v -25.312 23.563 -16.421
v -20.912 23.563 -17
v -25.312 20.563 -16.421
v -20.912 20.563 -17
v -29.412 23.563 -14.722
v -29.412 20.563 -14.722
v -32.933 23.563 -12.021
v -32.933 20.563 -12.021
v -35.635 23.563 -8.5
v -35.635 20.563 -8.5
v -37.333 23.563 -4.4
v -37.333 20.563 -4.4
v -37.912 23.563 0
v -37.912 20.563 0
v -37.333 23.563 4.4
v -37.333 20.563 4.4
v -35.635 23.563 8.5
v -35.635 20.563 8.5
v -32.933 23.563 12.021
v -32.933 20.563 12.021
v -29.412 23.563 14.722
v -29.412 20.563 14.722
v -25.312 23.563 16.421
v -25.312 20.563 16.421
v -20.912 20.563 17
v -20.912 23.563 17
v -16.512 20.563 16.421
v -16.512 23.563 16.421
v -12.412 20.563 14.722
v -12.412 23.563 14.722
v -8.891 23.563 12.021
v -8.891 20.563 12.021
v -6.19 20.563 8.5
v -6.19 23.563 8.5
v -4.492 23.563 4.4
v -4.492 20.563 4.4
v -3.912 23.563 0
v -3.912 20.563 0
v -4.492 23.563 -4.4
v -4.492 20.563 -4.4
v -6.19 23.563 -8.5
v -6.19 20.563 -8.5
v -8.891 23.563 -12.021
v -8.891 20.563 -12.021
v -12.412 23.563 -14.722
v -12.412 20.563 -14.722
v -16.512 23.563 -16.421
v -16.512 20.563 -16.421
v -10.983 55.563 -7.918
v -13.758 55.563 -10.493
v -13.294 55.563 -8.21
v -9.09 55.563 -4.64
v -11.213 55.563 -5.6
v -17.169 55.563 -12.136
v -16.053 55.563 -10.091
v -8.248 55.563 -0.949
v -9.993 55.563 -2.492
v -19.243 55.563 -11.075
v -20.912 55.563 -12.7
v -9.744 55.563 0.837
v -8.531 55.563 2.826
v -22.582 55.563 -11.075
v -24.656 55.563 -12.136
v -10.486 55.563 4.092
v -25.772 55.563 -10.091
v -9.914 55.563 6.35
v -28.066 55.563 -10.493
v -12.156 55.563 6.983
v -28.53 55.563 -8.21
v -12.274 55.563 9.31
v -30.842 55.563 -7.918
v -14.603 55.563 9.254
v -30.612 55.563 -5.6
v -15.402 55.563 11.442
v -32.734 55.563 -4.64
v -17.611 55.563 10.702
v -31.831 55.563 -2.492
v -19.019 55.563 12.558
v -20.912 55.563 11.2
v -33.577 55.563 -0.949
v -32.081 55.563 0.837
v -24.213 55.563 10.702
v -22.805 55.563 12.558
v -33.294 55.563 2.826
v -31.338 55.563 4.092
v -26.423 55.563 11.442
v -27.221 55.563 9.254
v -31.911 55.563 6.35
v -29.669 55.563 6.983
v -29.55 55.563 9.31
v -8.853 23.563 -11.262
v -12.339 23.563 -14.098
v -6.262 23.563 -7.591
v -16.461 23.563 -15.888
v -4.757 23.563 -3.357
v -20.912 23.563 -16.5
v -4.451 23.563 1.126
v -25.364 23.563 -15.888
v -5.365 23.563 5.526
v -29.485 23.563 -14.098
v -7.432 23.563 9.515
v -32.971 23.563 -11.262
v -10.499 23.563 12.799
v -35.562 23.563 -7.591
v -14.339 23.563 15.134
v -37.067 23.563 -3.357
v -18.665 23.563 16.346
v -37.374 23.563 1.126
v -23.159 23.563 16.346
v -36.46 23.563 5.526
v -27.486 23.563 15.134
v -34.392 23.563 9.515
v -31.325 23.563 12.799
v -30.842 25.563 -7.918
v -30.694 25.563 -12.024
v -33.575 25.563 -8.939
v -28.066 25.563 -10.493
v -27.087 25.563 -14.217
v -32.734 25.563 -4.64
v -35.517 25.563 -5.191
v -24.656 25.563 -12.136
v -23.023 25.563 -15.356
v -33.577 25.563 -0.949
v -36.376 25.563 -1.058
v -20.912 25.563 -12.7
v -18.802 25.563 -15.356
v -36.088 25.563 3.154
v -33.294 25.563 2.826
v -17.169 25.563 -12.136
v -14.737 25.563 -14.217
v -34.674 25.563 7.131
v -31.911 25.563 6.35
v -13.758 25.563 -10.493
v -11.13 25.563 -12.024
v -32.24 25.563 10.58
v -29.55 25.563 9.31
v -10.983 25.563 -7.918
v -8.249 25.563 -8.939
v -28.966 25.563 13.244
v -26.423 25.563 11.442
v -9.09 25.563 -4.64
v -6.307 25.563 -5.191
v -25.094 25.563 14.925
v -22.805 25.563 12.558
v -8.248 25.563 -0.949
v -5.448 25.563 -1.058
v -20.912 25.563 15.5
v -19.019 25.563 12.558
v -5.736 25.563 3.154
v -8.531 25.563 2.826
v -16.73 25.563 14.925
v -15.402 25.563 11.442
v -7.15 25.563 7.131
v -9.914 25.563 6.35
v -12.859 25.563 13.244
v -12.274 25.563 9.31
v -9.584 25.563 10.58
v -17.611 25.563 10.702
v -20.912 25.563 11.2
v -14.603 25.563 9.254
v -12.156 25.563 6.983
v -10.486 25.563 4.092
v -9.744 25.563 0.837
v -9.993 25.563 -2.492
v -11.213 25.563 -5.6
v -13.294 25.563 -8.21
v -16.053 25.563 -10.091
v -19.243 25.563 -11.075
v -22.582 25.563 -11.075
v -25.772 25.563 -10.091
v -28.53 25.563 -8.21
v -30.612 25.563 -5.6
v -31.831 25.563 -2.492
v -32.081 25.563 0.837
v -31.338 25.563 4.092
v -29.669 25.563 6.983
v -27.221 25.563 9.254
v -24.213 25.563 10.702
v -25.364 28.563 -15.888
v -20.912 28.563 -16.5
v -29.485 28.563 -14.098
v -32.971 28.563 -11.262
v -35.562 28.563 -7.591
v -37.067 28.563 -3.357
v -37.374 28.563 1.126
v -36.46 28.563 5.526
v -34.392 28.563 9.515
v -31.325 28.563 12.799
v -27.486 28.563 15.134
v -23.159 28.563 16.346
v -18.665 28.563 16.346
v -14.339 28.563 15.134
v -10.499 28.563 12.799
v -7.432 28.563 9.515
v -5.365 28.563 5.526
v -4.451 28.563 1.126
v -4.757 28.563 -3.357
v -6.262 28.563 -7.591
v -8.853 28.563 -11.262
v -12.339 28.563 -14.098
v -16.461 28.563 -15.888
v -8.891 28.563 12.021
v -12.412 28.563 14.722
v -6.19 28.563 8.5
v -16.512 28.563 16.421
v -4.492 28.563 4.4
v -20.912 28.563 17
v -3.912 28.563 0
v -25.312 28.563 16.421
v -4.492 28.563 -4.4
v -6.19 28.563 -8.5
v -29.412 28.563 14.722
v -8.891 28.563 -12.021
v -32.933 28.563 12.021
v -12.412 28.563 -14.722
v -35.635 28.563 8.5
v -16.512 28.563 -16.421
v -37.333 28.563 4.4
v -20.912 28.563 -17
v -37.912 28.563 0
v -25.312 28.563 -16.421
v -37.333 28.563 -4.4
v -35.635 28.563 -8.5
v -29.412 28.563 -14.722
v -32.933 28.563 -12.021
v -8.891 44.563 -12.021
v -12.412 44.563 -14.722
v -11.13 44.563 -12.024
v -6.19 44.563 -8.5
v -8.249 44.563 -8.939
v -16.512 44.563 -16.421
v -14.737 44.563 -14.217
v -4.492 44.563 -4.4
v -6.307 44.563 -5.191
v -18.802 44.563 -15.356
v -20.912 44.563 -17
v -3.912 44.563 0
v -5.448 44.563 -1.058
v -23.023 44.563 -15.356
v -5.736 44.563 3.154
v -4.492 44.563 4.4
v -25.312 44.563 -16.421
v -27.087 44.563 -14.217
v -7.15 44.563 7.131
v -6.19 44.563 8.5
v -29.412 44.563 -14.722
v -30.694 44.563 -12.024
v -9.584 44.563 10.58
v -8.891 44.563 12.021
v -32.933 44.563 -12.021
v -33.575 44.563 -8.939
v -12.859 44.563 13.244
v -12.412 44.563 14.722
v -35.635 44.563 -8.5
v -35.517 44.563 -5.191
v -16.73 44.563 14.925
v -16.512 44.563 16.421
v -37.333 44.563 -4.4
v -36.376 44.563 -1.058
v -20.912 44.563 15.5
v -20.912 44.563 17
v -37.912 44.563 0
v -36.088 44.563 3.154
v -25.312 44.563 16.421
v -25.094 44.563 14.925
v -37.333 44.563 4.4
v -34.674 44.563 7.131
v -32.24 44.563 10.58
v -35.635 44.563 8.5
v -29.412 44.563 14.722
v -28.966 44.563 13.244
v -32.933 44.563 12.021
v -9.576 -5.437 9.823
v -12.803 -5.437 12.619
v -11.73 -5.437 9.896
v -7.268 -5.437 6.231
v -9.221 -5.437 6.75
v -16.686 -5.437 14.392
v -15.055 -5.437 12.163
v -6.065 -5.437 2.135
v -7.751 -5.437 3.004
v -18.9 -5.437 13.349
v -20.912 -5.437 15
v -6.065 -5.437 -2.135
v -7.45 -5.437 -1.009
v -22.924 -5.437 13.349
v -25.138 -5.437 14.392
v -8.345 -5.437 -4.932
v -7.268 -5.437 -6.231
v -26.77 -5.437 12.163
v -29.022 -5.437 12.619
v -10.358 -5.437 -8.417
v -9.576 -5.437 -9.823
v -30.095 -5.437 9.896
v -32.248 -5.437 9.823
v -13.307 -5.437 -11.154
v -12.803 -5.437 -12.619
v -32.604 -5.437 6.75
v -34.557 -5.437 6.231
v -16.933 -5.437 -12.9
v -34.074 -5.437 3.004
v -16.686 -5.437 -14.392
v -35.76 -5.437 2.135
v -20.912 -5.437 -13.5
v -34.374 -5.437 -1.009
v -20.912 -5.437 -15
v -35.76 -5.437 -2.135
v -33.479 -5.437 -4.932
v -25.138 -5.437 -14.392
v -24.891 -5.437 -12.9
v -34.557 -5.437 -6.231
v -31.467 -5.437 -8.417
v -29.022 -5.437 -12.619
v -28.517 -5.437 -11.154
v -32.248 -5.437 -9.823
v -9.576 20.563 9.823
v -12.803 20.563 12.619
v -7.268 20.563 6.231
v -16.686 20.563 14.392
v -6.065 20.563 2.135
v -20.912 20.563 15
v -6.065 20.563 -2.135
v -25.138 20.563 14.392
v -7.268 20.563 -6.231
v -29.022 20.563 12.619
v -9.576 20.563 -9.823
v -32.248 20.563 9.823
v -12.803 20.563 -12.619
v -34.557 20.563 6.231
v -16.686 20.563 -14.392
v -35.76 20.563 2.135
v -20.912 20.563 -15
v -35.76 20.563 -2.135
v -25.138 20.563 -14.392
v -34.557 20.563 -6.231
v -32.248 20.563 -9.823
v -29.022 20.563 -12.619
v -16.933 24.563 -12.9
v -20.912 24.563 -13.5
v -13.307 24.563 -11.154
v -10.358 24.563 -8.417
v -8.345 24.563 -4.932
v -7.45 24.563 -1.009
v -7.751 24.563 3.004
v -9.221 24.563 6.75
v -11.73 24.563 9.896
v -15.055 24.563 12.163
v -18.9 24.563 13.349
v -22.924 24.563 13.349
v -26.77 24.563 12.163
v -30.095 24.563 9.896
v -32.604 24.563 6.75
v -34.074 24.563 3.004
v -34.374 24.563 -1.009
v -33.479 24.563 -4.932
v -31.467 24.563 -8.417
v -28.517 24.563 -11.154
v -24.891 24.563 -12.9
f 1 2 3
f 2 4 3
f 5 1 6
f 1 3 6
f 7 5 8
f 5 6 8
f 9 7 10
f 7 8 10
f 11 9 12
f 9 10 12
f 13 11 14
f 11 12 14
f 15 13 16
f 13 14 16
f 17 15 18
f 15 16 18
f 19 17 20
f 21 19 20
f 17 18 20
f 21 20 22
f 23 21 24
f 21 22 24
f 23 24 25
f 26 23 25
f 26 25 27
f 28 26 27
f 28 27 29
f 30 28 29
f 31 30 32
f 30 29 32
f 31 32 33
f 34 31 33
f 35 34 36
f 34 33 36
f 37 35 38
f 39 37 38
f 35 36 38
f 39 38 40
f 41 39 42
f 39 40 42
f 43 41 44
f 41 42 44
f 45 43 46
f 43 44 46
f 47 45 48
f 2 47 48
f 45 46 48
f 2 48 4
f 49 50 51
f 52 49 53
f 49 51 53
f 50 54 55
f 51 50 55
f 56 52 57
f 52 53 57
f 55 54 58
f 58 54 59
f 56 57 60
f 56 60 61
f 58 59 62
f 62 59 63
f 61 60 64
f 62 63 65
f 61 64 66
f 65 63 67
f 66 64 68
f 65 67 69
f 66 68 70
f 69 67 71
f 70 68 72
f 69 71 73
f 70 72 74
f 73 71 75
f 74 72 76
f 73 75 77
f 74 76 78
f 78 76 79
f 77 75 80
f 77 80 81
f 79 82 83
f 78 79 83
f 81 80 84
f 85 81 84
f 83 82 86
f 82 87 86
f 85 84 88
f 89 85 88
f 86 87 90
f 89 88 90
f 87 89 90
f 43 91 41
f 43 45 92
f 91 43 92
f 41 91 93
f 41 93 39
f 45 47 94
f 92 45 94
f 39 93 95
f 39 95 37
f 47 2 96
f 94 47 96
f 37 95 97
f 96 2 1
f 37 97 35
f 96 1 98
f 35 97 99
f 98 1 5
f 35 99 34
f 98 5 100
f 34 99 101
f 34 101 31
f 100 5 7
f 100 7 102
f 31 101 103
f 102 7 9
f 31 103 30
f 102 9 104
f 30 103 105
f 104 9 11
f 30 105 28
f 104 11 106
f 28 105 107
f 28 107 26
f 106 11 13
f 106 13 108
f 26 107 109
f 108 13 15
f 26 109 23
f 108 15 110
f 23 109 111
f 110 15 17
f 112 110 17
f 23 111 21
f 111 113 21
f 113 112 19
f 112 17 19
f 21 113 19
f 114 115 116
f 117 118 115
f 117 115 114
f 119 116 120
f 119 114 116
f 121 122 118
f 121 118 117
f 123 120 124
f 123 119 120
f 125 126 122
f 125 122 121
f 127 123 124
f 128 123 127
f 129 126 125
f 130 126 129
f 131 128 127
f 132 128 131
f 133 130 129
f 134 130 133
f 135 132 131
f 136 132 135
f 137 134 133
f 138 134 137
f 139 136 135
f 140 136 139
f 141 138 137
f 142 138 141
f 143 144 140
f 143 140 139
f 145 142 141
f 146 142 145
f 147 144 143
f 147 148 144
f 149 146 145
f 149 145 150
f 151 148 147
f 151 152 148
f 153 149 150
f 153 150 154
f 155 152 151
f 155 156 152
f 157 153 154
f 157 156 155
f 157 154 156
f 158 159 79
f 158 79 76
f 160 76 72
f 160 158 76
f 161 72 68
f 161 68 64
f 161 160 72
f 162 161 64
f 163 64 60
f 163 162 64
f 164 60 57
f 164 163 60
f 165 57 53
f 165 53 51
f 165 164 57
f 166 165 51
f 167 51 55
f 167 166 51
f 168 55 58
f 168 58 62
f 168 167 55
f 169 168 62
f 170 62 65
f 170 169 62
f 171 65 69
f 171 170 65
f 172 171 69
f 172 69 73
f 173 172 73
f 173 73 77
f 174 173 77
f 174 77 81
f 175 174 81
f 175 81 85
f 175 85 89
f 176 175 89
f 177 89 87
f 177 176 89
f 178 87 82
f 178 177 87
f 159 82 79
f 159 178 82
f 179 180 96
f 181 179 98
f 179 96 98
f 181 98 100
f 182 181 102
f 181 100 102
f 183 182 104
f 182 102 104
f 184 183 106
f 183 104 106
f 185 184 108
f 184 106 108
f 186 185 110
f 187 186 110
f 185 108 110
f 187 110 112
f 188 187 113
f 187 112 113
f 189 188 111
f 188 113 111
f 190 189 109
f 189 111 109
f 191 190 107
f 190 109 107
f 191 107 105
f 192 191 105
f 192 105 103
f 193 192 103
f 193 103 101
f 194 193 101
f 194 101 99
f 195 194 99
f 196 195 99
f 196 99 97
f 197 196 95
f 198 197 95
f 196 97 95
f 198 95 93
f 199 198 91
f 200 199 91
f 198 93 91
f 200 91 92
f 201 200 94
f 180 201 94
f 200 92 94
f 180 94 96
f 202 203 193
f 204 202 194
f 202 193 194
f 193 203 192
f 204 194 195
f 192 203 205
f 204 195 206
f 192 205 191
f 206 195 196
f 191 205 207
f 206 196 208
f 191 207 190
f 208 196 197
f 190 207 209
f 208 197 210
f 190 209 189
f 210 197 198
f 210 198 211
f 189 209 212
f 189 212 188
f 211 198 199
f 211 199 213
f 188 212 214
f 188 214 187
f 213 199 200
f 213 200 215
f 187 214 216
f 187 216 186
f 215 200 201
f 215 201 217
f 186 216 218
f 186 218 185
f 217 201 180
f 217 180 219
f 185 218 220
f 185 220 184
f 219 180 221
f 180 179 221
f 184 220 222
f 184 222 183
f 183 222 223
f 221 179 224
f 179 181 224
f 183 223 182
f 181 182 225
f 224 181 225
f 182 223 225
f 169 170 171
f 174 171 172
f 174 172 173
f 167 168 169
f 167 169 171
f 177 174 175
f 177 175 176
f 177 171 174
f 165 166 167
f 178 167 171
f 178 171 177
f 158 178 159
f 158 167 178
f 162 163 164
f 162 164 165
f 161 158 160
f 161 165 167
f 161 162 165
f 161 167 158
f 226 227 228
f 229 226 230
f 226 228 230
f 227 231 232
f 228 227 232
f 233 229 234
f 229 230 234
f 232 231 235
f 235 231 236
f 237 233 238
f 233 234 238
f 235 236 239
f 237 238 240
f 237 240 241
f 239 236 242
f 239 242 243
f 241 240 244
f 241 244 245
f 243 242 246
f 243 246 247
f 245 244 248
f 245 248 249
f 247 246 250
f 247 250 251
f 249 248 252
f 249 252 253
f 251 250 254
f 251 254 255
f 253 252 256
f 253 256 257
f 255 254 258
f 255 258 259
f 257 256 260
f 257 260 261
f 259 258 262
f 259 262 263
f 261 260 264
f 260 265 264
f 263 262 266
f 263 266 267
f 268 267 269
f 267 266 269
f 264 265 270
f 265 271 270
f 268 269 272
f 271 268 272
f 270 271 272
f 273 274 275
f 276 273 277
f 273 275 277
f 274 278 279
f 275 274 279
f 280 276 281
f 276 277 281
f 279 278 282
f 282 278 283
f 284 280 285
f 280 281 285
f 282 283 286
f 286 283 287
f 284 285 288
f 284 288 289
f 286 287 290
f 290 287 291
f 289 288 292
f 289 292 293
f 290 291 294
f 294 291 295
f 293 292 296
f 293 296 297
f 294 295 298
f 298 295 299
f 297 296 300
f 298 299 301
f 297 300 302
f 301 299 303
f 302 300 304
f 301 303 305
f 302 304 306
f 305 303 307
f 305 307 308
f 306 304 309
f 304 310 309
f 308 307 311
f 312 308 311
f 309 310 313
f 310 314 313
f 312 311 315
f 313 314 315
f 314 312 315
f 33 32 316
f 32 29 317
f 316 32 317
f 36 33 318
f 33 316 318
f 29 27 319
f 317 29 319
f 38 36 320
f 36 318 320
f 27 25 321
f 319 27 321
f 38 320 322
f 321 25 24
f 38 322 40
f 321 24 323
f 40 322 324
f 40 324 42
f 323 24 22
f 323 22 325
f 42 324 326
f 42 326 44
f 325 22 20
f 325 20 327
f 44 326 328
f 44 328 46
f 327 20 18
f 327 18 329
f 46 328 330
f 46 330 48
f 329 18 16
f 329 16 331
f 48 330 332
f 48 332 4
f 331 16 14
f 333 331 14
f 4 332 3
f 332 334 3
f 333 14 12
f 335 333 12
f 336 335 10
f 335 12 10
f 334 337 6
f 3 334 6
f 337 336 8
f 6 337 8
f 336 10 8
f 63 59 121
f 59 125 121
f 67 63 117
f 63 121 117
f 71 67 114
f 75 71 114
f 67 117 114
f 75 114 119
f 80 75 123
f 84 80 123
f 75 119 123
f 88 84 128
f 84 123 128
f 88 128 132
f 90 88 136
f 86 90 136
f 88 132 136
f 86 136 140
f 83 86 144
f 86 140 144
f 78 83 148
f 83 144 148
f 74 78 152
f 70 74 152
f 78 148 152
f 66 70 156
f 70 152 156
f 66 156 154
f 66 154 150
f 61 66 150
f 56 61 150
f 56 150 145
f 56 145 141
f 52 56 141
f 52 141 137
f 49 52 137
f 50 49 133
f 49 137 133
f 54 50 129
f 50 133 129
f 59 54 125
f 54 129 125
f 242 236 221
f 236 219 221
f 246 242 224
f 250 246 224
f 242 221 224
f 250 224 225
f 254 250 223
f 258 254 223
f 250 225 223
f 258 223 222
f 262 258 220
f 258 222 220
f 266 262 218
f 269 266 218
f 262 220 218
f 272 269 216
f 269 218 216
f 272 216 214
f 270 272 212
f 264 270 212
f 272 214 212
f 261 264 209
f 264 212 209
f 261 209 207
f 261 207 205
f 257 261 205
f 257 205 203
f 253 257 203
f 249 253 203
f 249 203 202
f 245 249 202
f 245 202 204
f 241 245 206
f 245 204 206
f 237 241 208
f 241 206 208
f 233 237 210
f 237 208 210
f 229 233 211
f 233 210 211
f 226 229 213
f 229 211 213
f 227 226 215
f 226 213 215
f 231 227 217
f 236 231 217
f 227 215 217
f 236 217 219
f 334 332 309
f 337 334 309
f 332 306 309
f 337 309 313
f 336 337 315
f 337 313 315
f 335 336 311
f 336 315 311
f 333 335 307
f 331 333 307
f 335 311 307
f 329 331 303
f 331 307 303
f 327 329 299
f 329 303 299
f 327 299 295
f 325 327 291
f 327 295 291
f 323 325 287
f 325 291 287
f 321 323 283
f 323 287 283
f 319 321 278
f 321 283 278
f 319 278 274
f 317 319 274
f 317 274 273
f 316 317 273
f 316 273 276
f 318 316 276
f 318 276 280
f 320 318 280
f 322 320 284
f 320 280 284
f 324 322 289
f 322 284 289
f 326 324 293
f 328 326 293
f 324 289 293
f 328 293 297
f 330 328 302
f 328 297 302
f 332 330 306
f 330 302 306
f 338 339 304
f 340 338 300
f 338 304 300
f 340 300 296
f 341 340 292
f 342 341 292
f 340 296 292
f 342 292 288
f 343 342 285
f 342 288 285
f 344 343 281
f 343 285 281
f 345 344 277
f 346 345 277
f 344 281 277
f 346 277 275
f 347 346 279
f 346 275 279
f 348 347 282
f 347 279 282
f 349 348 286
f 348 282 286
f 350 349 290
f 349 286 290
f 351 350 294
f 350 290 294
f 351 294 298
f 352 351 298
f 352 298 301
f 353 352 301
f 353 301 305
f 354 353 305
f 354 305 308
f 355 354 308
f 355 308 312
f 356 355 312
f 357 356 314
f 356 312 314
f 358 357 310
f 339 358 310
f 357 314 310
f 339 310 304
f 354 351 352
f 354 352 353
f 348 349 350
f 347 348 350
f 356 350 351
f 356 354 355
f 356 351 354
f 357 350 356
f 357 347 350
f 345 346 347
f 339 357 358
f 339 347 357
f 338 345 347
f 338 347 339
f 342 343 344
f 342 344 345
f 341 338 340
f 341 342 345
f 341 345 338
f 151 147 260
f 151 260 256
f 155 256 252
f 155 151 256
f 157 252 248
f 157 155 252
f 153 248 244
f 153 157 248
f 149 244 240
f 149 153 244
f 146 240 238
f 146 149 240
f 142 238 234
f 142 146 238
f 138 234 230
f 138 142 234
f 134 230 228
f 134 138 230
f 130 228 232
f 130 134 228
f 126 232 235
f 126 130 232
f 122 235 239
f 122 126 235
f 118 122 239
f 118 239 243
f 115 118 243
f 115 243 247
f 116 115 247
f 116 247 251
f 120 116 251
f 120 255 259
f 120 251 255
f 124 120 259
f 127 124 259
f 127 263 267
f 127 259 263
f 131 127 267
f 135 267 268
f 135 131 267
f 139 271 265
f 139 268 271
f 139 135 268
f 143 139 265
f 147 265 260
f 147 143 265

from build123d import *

# Parameters (mm, degrees)
KES_EKSTR_ZYON1_START = -30
IZIM2_R               = 15.5
IZIM2_R_2             = 12.7
IZIM2_R_3             = 11.2
KES_EKSTR_ZYON1_DEPTH = 30
IZIM3_R               = 13.5
KES_EKSTR_ZYON2_DEPTH = 30


with BuildPart() as part:
    # Çizim1 → Döndür1 (revolve)
    with BuildSketch(Plane.XY, mode=Mode.PRIVATE) as d_nd_r1_sk:
        Polygon((-20.912241055, -5.436911488), (-20.912241055, 55.563088512), (-33.612241055, 55.563088512), (-33.612241055, 44.563088512), (-37.912241055, 44.563088512), (-37.912241055, 28.563088512), (-37.412241055, 28.563088512), (-37.412241055, 23.563088512), (-37.912241055, 23.563088512), (-37.912241055, 20.563088512), (-35.912241055, 20.563088512), (-35.912241055, -5.436911488), align=None)
    revolve(d_nd_r1_sk.sketch.rotate(Axis((-20.912241055, -5.436911488, 0), (0, 1, 0)), 270), axis=Axis((-20.912241055, -5.436911488, 0), (0, 1, 0)))

    # Çizim2 → Kes-Ekstrüzyon1 (cut)
    # profile 1 of 2: a face of its own
    with BuildSketch(Plane(origin=(0, 55.563088512, 0), x_dir=(1, 0, 0), z_dir=(0, 1, 0)).offset(KES_EKSTR_ZYON1_START)):
        with Locations(Location((-20.912241055, 0, 0), (0, 0, 270))):
            Circle(IZIM2_R)
        with Locations(Location((-20.912241055, 0, 0), (0, 0, 90))):
            Circle(IZIM2_R_2, mode=Mode.SUBTRACT)
    # profile 2 of 2: a face of its own
    with BuildSketch(Plane(origin=(0, 55.563088512, 0), x_dir=(1, 0, 0), z_dir=(0, 1, 0)).offset(KES_EKSTR_ZYON1_START)):
        with Locations(Location((-20.912241055, 0, 0), (0, 0, 270))):
            Circle(IZIM2_R_3)
    extrude(amount=KES_EKSTR_ZYON1_DEPTH, mode=Mode.SUBTRACT)

    # Çizim3 → Kes-Ekstrüzyon2 (cut)
    with BuildSketch(Plane.XZ.offset(5.436911488)):
        with Locations(Location((-20.912241055, 0, 0), (0, 0, 270))):
            Circle(IZIM3_R)
    extrude(amount=-KES_EKSTR_ZYON2_DEPTH, mode=Mode.SUBTRACT)


solid = part.part
